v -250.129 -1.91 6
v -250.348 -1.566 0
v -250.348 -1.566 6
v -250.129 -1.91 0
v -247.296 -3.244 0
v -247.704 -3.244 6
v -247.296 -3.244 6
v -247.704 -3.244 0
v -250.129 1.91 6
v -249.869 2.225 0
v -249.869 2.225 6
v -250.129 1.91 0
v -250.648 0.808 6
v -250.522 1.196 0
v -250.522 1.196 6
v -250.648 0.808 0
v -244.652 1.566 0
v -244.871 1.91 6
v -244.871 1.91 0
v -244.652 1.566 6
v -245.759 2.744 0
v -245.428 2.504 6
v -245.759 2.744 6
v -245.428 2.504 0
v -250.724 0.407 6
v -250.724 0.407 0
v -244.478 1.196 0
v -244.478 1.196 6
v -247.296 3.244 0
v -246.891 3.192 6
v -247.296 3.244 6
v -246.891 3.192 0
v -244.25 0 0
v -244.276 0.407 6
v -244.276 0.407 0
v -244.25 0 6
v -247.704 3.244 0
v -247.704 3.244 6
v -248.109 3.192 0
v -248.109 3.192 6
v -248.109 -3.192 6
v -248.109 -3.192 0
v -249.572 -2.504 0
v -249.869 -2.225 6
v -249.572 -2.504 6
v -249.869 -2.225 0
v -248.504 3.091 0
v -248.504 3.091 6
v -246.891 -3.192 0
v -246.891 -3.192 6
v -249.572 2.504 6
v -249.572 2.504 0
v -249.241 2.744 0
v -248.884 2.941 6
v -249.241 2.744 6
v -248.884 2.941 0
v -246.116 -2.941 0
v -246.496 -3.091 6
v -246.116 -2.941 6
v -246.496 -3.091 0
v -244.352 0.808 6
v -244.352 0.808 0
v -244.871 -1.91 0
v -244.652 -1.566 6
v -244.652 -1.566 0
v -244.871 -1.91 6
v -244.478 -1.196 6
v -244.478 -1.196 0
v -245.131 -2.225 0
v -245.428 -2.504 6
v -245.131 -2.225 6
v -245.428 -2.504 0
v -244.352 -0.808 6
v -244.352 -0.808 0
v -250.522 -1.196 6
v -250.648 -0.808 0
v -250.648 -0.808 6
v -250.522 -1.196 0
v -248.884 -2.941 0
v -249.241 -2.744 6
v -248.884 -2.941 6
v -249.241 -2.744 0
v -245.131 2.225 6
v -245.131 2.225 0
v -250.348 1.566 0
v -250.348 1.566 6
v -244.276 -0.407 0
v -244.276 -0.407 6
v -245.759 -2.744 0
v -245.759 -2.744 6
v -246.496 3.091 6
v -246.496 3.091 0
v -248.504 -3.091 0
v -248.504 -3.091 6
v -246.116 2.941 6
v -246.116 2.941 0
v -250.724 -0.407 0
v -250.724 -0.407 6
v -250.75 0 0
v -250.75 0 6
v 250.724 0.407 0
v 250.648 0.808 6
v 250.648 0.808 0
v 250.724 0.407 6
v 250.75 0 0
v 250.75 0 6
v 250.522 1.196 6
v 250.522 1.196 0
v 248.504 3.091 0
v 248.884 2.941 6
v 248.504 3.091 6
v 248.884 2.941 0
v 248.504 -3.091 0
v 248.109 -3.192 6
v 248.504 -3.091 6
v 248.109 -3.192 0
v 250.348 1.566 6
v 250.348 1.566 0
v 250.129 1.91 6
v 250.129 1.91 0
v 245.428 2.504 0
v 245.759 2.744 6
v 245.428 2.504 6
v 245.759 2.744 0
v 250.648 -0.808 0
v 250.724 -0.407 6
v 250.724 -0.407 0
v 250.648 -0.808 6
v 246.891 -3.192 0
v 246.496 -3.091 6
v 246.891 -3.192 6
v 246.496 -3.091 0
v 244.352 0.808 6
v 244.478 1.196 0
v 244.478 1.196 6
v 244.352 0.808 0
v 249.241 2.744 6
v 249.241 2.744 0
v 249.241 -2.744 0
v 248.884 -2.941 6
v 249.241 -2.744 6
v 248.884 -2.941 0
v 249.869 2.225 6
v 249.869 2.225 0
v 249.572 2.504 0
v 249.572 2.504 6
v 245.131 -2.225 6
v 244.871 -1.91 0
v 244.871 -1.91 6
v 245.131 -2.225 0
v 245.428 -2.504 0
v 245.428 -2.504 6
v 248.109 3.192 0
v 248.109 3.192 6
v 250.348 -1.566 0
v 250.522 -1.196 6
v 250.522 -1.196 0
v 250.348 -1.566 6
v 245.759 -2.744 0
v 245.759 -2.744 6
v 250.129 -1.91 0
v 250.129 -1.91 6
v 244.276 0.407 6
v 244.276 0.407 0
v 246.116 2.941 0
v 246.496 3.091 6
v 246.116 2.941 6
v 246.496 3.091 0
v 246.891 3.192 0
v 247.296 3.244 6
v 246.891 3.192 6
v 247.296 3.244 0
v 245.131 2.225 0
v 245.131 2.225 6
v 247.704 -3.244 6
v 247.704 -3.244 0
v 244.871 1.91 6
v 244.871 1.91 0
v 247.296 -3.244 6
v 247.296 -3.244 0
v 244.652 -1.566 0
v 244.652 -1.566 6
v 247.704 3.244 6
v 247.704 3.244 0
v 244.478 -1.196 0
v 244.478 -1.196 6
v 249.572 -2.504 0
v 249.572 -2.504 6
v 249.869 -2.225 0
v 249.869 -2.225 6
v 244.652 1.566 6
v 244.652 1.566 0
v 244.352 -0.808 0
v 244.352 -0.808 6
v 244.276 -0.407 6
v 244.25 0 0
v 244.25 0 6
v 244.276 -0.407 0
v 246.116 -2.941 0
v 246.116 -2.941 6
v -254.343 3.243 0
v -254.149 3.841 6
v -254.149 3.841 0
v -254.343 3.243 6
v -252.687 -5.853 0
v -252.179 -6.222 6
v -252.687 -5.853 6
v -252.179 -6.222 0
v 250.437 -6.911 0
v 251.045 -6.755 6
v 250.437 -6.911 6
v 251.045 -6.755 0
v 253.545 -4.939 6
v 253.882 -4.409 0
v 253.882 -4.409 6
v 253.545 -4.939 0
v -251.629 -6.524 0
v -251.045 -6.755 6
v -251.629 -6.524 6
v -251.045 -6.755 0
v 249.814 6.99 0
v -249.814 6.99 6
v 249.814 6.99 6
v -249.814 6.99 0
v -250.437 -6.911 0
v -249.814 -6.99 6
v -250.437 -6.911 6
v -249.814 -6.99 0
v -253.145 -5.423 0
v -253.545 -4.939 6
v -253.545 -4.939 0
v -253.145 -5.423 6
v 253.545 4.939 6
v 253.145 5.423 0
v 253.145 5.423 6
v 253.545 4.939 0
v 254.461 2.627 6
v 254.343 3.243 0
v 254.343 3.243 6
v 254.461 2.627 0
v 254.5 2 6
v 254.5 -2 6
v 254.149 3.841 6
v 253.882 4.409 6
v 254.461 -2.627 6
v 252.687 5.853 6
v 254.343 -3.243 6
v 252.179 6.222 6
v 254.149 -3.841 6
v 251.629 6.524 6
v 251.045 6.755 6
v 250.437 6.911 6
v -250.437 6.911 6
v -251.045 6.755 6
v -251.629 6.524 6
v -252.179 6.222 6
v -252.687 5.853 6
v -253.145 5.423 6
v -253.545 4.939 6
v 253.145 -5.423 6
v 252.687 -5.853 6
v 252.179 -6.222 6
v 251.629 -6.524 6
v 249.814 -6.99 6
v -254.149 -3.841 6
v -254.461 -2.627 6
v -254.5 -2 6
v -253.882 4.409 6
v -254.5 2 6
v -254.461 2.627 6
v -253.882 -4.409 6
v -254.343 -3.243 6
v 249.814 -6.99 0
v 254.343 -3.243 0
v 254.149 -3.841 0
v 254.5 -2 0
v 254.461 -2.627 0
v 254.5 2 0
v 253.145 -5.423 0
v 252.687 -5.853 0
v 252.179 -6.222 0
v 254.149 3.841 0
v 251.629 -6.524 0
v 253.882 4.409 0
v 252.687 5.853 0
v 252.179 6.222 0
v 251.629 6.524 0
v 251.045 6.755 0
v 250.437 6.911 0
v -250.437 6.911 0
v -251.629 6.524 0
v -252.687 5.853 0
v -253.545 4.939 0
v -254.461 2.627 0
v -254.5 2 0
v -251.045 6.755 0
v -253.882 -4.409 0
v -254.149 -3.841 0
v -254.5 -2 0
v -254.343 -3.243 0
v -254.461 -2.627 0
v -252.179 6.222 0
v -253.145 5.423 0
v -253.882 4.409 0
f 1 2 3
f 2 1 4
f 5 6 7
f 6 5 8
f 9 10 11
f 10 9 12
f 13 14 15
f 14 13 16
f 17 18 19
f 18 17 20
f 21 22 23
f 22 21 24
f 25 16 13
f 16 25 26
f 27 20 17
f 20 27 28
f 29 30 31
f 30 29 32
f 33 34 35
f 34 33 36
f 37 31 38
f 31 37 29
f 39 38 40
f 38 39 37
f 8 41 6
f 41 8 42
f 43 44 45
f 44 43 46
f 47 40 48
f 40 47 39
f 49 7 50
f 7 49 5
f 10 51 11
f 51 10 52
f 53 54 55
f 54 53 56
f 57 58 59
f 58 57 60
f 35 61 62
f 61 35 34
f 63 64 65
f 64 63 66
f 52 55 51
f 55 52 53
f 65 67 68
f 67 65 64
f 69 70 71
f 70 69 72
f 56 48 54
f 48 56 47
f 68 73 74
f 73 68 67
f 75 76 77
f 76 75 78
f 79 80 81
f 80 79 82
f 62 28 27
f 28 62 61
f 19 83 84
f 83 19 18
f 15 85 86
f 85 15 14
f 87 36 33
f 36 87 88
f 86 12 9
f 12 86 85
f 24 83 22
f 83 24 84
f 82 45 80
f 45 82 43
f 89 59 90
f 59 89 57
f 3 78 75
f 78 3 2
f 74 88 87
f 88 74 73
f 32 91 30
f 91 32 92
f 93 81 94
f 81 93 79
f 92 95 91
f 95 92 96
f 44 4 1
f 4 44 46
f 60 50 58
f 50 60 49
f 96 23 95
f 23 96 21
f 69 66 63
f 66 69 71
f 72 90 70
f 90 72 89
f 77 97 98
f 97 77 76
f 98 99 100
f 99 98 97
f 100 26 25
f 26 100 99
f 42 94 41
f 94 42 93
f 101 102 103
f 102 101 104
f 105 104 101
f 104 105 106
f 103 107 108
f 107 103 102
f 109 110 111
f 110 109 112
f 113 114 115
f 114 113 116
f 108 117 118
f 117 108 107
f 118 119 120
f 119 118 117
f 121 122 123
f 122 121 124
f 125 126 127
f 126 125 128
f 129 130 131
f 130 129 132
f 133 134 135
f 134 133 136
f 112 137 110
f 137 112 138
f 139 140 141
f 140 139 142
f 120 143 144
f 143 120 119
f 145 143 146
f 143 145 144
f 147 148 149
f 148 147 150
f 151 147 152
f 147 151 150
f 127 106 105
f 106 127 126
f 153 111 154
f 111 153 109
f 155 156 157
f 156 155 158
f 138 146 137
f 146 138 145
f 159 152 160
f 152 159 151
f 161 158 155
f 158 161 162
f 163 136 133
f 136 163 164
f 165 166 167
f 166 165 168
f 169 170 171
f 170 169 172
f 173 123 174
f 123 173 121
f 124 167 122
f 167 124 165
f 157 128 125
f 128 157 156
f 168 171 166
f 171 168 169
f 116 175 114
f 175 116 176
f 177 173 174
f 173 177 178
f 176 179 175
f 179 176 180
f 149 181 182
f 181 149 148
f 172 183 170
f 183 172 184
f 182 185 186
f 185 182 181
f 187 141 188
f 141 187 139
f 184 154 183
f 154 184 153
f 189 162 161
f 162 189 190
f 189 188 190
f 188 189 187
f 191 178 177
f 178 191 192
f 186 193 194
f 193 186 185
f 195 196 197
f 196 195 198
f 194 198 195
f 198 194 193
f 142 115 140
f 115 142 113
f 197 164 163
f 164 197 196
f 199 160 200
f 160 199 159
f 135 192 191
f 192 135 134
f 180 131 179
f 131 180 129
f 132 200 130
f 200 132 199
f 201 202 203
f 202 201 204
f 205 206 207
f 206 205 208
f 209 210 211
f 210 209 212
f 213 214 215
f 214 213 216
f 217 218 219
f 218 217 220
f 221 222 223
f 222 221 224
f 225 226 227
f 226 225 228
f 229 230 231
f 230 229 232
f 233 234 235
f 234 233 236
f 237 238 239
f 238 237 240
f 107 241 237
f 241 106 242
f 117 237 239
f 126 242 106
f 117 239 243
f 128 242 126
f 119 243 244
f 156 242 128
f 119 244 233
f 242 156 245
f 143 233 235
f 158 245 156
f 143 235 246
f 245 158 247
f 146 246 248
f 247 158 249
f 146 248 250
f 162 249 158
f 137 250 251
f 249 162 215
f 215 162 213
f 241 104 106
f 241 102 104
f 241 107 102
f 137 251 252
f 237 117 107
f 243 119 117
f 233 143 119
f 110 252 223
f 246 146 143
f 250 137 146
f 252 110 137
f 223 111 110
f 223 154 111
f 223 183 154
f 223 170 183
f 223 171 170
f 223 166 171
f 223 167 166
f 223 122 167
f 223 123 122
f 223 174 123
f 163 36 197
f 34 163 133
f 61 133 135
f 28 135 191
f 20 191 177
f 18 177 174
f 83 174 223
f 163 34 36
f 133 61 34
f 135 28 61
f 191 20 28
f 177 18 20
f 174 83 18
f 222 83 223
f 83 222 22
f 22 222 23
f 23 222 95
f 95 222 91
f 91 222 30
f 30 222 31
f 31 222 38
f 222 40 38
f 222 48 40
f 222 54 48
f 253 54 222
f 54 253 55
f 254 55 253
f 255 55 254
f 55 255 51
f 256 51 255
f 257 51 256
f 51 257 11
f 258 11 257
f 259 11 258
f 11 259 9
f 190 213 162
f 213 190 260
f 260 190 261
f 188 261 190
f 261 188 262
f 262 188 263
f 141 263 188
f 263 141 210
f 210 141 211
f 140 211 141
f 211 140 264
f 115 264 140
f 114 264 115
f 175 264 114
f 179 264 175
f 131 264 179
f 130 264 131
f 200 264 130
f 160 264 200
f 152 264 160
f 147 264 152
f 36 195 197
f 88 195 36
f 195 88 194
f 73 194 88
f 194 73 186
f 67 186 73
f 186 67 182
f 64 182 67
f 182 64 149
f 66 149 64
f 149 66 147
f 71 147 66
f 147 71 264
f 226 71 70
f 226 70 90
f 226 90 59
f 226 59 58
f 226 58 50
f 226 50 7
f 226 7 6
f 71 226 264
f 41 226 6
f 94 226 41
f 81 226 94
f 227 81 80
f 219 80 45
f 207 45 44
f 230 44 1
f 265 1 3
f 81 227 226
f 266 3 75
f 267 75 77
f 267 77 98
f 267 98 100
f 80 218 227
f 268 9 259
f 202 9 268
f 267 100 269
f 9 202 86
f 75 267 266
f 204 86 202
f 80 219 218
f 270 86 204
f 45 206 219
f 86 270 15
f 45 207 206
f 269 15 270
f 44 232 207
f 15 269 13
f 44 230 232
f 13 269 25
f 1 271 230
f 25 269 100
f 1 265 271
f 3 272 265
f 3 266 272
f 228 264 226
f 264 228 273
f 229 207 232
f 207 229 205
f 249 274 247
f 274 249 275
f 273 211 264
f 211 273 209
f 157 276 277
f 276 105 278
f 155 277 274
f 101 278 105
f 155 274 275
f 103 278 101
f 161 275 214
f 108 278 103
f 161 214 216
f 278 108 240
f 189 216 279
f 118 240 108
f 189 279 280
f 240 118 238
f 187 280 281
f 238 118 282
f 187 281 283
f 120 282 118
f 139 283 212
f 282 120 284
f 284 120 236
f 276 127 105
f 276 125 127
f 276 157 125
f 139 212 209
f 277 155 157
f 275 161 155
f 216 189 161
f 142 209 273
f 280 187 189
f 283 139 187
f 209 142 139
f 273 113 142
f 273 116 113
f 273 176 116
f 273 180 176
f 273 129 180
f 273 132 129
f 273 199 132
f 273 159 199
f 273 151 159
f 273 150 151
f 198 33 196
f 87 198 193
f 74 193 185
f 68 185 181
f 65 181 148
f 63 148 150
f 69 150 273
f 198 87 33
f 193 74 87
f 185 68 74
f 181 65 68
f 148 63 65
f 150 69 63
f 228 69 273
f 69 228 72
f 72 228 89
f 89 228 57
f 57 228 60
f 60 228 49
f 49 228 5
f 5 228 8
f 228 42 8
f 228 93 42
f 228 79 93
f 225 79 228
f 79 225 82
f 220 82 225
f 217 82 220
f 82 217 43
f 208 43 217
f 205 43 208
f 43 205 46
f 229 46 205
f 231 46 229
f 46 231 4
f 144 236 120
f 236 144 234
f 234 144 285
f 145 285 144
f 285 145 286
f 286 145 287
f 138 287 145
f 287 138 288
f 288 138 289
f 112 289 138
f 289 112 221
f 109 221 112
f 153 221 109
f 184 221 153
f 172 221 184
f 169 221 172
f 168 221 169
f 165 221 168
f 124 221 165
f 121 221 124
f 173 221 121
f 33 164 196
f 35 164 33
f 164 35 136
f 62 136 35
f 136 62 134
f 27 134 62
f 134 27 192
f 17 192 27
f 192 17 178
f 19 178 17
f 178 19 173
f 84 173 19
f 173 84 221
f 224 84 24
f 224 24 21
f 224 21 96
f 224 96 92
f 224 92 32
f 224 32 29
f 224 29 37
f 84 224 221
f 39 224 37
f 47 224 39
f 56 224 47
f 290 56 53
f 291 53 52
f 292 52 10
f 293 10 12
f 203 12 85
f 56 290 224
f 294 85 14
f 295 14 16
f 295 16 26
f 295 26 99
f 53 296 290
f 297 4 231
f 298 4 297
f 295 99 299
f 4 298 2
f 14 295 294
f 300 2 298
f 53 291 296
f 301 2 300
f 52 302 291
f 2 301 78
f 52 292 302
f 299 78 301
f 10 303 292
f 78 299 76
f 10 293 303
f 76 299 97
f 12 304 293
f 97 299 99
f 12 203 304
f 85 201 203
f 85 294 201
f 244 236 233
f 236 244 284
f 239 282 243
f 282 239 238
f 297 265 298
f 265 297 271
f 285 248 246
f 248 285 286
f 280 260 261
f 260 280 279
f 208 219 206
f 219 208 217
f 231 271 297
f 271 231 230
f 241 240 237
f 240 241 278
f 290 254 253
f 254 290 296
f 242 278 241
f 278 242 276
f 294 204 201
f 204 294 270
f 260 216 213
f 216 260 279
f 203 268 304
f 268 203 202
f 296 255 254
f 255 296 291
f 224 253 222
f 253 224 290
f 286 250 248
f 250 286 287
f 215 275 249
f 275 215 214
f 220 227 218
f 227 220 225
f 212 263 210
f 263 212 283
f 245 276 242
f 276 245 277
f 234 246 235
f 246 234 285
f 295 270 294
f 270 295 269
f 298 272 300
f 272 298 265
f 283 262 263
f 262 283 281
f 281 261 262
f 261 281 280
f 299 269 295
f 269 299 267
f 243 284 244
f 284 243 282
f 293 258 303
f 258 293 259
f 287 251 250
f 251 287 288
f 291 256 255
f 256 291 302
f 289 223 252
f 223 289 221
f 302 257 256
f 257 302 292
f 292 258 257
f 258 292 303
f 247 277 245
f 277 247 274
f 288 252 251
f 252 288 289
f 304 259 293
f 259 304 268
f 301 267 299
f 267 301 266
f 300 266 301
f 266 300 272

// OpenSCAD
$fn = 50;


difference() {
	union() {
		hull() {
			translate(v = [-249.5000000000, 2.0000000000, 0]) {
				cylinder(h = 6, r = 5);
			}
			translate(v = [249.5000000000, 2.0000000000, 0]) {
				cylinder(h = 6, r = 5);
			}
			translate(v = [-249.5000000000, -2.0000000000, 0]) {
				cylinder(h = 6, r = 5);
			}
			translate(v = [249.5000000000, -2.0000000000, 0]) {
				cylinder(h = 6, r = 5);
			}
		}
	}
	union() {
		translate(v = [-247.5000000000, 0.0000000000, -100.0000000000]) {
			cylinder(h = 200, r = 3.2500000000);
		}
		translate(v = [-247.5000000000, 0.0000000000, -100.0000000000]) {
			cylinder(h = 200, r = 3.2500000000);
		}
		translate(v = [247.5000000000, 0.0000000000, -100.0000000000]) {
			cylinder(h = 200, r = 3.2500000000);
		}
		translate(v = [247.5000000000, 0.0000000000, -100.0000000000]) {
			cylinder(h = 200, r = 3.2500000000);
		}
	}
}
